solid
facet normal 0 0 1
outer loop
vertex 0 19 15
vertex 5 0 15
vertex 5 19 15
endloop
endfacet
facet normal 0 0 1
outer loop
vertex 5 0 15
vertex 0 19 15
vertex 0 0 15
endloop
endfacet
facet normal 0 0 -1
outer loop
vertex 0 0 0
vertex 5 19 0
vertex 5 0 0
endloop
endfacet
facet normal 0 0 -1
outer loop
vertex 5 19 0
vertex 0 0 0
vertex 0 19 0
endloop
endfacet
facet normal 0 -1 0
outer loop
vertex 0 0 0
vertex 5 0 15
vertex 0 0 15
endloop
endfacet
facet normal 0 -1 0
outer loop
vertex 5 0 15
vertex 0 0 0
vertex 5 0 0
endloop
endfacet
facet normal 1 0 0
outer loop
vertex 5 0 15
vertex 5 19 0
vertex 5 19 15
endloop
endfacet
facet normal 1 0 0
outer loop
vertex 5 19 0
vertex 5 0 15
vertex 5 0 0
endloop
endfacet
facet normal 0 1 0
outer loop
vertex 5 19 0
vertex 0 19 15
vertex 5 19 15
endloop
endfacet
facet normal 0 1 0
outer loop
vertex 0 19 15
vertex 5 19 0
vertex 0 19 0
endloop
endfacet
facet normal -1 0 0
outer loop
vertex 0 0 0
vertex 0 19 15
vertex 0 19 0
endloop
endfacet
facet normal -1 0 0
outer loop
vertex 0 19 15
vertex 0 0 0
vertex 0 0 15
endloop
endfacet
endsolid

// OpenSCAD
// Generated by SolidPython 1.0.1 on 2020-07-29 00:46:54


cube(size = [5, 19, 15]);
/***********************************************
*********      SolidPython code:      **********
************************************************
 
# import packages: SolidPython
from solid import *
from solid.utils import *
from itertools import chain, combinations, permutations


class Resize:

    def __init__(self, scad_file):
        self.scad_file = scad_file
        #self.scad_file = import_scad(scad_file)
        # cone/cylinder param:
        self.r1 = 0
        self.r2 = 0
        self.h = 0
        # rectangular prism param:
        self.w = 0
        self.l = 0
        # ellipse param:
        self.r = 0

    # import OpenScad code (file name corresponds to shape)


    # classify shape + parameters
    def assign(self, param1, param2, param3):
        if self.scad_file == 'cone.scad':
            self.r1 = param1
            self.r2 = param2
            self.h = param3
        elif self.scad_file == 'cylinder.scad':
            self.r1 = param1
            self.r2 = param2
            self.h = param3
        elif self.scad_file == 'rectangularPrism.scad':
            self.h = param1
            self.l = param2
            self.w = param3
        else:
            self.r = param1
            self.h = param2

    # resize parameters
    def iterate(self):
        x = range(3, 20, 2)
        i = 1
        if self.scad_file == 'cone.scad':
            tempList = list(permutations(x, 2))
            for temp in tempList:
                param1 = temp[0]
                param2 = temp[1]
                filepath = 'produced_scad_files/' + 'cone' + str(param1) + '_' + str(param2) + '_' + '.scad'
                scad_render_to_file(cylinder(h=param1, r1=param2, r2=0), filepath)

        elif self.scad_file == 'cylinder.scad':
            tempList = list(permutations(x, 3))
            for temp in tempList:
                param1 = temp[0]
                param2 = temp[1]
                filepath = 'produced_scad_files/' + 'cylinder' + str(param1) + '_' + str(param2) + '_' + '.scad'
                scad_render_to_file(cylinder(h=param1, r1=param2, r2=param2), filepath)

        elif self.scad_file == 'rectangularPrism.scad':
            tempList = list(permutations(x, 3))
            for temp in tempList:
                param1 = temp[0]
                param2 = temp[1]
                param3 = temp[2]
                filepath = 'produced_scad_files/' + 'rectangularPrism' + str(param1) + '_' + str(param2) + '_' + str(
                    param3) + '.scad'
                scad_render_to_file(cube(size=(param1, param2, param3)), filepath)

        elif self.scad_file == 'ellipse.scad':
            tempList = list(permutations(x, 4))
            for temp in tempList:
                param1 = temp[0]
                param2 = temp[1]
                param3 = temp[2]
                param4 = temp[3]
                filepath = 'produced_scad_files/' + 'ellipse' + str(param1) + '_' + str(param2) + '_' + str(param3) + '_' + str(param4) + '.scad'
                scad_render_to_file(scale([param1, param2, param3])(sphere(r=param4)), filepath)

    def render_to_scadfile(self):
        scad_render_to_file(scad, 'example.scad') 
 
************************************************/
